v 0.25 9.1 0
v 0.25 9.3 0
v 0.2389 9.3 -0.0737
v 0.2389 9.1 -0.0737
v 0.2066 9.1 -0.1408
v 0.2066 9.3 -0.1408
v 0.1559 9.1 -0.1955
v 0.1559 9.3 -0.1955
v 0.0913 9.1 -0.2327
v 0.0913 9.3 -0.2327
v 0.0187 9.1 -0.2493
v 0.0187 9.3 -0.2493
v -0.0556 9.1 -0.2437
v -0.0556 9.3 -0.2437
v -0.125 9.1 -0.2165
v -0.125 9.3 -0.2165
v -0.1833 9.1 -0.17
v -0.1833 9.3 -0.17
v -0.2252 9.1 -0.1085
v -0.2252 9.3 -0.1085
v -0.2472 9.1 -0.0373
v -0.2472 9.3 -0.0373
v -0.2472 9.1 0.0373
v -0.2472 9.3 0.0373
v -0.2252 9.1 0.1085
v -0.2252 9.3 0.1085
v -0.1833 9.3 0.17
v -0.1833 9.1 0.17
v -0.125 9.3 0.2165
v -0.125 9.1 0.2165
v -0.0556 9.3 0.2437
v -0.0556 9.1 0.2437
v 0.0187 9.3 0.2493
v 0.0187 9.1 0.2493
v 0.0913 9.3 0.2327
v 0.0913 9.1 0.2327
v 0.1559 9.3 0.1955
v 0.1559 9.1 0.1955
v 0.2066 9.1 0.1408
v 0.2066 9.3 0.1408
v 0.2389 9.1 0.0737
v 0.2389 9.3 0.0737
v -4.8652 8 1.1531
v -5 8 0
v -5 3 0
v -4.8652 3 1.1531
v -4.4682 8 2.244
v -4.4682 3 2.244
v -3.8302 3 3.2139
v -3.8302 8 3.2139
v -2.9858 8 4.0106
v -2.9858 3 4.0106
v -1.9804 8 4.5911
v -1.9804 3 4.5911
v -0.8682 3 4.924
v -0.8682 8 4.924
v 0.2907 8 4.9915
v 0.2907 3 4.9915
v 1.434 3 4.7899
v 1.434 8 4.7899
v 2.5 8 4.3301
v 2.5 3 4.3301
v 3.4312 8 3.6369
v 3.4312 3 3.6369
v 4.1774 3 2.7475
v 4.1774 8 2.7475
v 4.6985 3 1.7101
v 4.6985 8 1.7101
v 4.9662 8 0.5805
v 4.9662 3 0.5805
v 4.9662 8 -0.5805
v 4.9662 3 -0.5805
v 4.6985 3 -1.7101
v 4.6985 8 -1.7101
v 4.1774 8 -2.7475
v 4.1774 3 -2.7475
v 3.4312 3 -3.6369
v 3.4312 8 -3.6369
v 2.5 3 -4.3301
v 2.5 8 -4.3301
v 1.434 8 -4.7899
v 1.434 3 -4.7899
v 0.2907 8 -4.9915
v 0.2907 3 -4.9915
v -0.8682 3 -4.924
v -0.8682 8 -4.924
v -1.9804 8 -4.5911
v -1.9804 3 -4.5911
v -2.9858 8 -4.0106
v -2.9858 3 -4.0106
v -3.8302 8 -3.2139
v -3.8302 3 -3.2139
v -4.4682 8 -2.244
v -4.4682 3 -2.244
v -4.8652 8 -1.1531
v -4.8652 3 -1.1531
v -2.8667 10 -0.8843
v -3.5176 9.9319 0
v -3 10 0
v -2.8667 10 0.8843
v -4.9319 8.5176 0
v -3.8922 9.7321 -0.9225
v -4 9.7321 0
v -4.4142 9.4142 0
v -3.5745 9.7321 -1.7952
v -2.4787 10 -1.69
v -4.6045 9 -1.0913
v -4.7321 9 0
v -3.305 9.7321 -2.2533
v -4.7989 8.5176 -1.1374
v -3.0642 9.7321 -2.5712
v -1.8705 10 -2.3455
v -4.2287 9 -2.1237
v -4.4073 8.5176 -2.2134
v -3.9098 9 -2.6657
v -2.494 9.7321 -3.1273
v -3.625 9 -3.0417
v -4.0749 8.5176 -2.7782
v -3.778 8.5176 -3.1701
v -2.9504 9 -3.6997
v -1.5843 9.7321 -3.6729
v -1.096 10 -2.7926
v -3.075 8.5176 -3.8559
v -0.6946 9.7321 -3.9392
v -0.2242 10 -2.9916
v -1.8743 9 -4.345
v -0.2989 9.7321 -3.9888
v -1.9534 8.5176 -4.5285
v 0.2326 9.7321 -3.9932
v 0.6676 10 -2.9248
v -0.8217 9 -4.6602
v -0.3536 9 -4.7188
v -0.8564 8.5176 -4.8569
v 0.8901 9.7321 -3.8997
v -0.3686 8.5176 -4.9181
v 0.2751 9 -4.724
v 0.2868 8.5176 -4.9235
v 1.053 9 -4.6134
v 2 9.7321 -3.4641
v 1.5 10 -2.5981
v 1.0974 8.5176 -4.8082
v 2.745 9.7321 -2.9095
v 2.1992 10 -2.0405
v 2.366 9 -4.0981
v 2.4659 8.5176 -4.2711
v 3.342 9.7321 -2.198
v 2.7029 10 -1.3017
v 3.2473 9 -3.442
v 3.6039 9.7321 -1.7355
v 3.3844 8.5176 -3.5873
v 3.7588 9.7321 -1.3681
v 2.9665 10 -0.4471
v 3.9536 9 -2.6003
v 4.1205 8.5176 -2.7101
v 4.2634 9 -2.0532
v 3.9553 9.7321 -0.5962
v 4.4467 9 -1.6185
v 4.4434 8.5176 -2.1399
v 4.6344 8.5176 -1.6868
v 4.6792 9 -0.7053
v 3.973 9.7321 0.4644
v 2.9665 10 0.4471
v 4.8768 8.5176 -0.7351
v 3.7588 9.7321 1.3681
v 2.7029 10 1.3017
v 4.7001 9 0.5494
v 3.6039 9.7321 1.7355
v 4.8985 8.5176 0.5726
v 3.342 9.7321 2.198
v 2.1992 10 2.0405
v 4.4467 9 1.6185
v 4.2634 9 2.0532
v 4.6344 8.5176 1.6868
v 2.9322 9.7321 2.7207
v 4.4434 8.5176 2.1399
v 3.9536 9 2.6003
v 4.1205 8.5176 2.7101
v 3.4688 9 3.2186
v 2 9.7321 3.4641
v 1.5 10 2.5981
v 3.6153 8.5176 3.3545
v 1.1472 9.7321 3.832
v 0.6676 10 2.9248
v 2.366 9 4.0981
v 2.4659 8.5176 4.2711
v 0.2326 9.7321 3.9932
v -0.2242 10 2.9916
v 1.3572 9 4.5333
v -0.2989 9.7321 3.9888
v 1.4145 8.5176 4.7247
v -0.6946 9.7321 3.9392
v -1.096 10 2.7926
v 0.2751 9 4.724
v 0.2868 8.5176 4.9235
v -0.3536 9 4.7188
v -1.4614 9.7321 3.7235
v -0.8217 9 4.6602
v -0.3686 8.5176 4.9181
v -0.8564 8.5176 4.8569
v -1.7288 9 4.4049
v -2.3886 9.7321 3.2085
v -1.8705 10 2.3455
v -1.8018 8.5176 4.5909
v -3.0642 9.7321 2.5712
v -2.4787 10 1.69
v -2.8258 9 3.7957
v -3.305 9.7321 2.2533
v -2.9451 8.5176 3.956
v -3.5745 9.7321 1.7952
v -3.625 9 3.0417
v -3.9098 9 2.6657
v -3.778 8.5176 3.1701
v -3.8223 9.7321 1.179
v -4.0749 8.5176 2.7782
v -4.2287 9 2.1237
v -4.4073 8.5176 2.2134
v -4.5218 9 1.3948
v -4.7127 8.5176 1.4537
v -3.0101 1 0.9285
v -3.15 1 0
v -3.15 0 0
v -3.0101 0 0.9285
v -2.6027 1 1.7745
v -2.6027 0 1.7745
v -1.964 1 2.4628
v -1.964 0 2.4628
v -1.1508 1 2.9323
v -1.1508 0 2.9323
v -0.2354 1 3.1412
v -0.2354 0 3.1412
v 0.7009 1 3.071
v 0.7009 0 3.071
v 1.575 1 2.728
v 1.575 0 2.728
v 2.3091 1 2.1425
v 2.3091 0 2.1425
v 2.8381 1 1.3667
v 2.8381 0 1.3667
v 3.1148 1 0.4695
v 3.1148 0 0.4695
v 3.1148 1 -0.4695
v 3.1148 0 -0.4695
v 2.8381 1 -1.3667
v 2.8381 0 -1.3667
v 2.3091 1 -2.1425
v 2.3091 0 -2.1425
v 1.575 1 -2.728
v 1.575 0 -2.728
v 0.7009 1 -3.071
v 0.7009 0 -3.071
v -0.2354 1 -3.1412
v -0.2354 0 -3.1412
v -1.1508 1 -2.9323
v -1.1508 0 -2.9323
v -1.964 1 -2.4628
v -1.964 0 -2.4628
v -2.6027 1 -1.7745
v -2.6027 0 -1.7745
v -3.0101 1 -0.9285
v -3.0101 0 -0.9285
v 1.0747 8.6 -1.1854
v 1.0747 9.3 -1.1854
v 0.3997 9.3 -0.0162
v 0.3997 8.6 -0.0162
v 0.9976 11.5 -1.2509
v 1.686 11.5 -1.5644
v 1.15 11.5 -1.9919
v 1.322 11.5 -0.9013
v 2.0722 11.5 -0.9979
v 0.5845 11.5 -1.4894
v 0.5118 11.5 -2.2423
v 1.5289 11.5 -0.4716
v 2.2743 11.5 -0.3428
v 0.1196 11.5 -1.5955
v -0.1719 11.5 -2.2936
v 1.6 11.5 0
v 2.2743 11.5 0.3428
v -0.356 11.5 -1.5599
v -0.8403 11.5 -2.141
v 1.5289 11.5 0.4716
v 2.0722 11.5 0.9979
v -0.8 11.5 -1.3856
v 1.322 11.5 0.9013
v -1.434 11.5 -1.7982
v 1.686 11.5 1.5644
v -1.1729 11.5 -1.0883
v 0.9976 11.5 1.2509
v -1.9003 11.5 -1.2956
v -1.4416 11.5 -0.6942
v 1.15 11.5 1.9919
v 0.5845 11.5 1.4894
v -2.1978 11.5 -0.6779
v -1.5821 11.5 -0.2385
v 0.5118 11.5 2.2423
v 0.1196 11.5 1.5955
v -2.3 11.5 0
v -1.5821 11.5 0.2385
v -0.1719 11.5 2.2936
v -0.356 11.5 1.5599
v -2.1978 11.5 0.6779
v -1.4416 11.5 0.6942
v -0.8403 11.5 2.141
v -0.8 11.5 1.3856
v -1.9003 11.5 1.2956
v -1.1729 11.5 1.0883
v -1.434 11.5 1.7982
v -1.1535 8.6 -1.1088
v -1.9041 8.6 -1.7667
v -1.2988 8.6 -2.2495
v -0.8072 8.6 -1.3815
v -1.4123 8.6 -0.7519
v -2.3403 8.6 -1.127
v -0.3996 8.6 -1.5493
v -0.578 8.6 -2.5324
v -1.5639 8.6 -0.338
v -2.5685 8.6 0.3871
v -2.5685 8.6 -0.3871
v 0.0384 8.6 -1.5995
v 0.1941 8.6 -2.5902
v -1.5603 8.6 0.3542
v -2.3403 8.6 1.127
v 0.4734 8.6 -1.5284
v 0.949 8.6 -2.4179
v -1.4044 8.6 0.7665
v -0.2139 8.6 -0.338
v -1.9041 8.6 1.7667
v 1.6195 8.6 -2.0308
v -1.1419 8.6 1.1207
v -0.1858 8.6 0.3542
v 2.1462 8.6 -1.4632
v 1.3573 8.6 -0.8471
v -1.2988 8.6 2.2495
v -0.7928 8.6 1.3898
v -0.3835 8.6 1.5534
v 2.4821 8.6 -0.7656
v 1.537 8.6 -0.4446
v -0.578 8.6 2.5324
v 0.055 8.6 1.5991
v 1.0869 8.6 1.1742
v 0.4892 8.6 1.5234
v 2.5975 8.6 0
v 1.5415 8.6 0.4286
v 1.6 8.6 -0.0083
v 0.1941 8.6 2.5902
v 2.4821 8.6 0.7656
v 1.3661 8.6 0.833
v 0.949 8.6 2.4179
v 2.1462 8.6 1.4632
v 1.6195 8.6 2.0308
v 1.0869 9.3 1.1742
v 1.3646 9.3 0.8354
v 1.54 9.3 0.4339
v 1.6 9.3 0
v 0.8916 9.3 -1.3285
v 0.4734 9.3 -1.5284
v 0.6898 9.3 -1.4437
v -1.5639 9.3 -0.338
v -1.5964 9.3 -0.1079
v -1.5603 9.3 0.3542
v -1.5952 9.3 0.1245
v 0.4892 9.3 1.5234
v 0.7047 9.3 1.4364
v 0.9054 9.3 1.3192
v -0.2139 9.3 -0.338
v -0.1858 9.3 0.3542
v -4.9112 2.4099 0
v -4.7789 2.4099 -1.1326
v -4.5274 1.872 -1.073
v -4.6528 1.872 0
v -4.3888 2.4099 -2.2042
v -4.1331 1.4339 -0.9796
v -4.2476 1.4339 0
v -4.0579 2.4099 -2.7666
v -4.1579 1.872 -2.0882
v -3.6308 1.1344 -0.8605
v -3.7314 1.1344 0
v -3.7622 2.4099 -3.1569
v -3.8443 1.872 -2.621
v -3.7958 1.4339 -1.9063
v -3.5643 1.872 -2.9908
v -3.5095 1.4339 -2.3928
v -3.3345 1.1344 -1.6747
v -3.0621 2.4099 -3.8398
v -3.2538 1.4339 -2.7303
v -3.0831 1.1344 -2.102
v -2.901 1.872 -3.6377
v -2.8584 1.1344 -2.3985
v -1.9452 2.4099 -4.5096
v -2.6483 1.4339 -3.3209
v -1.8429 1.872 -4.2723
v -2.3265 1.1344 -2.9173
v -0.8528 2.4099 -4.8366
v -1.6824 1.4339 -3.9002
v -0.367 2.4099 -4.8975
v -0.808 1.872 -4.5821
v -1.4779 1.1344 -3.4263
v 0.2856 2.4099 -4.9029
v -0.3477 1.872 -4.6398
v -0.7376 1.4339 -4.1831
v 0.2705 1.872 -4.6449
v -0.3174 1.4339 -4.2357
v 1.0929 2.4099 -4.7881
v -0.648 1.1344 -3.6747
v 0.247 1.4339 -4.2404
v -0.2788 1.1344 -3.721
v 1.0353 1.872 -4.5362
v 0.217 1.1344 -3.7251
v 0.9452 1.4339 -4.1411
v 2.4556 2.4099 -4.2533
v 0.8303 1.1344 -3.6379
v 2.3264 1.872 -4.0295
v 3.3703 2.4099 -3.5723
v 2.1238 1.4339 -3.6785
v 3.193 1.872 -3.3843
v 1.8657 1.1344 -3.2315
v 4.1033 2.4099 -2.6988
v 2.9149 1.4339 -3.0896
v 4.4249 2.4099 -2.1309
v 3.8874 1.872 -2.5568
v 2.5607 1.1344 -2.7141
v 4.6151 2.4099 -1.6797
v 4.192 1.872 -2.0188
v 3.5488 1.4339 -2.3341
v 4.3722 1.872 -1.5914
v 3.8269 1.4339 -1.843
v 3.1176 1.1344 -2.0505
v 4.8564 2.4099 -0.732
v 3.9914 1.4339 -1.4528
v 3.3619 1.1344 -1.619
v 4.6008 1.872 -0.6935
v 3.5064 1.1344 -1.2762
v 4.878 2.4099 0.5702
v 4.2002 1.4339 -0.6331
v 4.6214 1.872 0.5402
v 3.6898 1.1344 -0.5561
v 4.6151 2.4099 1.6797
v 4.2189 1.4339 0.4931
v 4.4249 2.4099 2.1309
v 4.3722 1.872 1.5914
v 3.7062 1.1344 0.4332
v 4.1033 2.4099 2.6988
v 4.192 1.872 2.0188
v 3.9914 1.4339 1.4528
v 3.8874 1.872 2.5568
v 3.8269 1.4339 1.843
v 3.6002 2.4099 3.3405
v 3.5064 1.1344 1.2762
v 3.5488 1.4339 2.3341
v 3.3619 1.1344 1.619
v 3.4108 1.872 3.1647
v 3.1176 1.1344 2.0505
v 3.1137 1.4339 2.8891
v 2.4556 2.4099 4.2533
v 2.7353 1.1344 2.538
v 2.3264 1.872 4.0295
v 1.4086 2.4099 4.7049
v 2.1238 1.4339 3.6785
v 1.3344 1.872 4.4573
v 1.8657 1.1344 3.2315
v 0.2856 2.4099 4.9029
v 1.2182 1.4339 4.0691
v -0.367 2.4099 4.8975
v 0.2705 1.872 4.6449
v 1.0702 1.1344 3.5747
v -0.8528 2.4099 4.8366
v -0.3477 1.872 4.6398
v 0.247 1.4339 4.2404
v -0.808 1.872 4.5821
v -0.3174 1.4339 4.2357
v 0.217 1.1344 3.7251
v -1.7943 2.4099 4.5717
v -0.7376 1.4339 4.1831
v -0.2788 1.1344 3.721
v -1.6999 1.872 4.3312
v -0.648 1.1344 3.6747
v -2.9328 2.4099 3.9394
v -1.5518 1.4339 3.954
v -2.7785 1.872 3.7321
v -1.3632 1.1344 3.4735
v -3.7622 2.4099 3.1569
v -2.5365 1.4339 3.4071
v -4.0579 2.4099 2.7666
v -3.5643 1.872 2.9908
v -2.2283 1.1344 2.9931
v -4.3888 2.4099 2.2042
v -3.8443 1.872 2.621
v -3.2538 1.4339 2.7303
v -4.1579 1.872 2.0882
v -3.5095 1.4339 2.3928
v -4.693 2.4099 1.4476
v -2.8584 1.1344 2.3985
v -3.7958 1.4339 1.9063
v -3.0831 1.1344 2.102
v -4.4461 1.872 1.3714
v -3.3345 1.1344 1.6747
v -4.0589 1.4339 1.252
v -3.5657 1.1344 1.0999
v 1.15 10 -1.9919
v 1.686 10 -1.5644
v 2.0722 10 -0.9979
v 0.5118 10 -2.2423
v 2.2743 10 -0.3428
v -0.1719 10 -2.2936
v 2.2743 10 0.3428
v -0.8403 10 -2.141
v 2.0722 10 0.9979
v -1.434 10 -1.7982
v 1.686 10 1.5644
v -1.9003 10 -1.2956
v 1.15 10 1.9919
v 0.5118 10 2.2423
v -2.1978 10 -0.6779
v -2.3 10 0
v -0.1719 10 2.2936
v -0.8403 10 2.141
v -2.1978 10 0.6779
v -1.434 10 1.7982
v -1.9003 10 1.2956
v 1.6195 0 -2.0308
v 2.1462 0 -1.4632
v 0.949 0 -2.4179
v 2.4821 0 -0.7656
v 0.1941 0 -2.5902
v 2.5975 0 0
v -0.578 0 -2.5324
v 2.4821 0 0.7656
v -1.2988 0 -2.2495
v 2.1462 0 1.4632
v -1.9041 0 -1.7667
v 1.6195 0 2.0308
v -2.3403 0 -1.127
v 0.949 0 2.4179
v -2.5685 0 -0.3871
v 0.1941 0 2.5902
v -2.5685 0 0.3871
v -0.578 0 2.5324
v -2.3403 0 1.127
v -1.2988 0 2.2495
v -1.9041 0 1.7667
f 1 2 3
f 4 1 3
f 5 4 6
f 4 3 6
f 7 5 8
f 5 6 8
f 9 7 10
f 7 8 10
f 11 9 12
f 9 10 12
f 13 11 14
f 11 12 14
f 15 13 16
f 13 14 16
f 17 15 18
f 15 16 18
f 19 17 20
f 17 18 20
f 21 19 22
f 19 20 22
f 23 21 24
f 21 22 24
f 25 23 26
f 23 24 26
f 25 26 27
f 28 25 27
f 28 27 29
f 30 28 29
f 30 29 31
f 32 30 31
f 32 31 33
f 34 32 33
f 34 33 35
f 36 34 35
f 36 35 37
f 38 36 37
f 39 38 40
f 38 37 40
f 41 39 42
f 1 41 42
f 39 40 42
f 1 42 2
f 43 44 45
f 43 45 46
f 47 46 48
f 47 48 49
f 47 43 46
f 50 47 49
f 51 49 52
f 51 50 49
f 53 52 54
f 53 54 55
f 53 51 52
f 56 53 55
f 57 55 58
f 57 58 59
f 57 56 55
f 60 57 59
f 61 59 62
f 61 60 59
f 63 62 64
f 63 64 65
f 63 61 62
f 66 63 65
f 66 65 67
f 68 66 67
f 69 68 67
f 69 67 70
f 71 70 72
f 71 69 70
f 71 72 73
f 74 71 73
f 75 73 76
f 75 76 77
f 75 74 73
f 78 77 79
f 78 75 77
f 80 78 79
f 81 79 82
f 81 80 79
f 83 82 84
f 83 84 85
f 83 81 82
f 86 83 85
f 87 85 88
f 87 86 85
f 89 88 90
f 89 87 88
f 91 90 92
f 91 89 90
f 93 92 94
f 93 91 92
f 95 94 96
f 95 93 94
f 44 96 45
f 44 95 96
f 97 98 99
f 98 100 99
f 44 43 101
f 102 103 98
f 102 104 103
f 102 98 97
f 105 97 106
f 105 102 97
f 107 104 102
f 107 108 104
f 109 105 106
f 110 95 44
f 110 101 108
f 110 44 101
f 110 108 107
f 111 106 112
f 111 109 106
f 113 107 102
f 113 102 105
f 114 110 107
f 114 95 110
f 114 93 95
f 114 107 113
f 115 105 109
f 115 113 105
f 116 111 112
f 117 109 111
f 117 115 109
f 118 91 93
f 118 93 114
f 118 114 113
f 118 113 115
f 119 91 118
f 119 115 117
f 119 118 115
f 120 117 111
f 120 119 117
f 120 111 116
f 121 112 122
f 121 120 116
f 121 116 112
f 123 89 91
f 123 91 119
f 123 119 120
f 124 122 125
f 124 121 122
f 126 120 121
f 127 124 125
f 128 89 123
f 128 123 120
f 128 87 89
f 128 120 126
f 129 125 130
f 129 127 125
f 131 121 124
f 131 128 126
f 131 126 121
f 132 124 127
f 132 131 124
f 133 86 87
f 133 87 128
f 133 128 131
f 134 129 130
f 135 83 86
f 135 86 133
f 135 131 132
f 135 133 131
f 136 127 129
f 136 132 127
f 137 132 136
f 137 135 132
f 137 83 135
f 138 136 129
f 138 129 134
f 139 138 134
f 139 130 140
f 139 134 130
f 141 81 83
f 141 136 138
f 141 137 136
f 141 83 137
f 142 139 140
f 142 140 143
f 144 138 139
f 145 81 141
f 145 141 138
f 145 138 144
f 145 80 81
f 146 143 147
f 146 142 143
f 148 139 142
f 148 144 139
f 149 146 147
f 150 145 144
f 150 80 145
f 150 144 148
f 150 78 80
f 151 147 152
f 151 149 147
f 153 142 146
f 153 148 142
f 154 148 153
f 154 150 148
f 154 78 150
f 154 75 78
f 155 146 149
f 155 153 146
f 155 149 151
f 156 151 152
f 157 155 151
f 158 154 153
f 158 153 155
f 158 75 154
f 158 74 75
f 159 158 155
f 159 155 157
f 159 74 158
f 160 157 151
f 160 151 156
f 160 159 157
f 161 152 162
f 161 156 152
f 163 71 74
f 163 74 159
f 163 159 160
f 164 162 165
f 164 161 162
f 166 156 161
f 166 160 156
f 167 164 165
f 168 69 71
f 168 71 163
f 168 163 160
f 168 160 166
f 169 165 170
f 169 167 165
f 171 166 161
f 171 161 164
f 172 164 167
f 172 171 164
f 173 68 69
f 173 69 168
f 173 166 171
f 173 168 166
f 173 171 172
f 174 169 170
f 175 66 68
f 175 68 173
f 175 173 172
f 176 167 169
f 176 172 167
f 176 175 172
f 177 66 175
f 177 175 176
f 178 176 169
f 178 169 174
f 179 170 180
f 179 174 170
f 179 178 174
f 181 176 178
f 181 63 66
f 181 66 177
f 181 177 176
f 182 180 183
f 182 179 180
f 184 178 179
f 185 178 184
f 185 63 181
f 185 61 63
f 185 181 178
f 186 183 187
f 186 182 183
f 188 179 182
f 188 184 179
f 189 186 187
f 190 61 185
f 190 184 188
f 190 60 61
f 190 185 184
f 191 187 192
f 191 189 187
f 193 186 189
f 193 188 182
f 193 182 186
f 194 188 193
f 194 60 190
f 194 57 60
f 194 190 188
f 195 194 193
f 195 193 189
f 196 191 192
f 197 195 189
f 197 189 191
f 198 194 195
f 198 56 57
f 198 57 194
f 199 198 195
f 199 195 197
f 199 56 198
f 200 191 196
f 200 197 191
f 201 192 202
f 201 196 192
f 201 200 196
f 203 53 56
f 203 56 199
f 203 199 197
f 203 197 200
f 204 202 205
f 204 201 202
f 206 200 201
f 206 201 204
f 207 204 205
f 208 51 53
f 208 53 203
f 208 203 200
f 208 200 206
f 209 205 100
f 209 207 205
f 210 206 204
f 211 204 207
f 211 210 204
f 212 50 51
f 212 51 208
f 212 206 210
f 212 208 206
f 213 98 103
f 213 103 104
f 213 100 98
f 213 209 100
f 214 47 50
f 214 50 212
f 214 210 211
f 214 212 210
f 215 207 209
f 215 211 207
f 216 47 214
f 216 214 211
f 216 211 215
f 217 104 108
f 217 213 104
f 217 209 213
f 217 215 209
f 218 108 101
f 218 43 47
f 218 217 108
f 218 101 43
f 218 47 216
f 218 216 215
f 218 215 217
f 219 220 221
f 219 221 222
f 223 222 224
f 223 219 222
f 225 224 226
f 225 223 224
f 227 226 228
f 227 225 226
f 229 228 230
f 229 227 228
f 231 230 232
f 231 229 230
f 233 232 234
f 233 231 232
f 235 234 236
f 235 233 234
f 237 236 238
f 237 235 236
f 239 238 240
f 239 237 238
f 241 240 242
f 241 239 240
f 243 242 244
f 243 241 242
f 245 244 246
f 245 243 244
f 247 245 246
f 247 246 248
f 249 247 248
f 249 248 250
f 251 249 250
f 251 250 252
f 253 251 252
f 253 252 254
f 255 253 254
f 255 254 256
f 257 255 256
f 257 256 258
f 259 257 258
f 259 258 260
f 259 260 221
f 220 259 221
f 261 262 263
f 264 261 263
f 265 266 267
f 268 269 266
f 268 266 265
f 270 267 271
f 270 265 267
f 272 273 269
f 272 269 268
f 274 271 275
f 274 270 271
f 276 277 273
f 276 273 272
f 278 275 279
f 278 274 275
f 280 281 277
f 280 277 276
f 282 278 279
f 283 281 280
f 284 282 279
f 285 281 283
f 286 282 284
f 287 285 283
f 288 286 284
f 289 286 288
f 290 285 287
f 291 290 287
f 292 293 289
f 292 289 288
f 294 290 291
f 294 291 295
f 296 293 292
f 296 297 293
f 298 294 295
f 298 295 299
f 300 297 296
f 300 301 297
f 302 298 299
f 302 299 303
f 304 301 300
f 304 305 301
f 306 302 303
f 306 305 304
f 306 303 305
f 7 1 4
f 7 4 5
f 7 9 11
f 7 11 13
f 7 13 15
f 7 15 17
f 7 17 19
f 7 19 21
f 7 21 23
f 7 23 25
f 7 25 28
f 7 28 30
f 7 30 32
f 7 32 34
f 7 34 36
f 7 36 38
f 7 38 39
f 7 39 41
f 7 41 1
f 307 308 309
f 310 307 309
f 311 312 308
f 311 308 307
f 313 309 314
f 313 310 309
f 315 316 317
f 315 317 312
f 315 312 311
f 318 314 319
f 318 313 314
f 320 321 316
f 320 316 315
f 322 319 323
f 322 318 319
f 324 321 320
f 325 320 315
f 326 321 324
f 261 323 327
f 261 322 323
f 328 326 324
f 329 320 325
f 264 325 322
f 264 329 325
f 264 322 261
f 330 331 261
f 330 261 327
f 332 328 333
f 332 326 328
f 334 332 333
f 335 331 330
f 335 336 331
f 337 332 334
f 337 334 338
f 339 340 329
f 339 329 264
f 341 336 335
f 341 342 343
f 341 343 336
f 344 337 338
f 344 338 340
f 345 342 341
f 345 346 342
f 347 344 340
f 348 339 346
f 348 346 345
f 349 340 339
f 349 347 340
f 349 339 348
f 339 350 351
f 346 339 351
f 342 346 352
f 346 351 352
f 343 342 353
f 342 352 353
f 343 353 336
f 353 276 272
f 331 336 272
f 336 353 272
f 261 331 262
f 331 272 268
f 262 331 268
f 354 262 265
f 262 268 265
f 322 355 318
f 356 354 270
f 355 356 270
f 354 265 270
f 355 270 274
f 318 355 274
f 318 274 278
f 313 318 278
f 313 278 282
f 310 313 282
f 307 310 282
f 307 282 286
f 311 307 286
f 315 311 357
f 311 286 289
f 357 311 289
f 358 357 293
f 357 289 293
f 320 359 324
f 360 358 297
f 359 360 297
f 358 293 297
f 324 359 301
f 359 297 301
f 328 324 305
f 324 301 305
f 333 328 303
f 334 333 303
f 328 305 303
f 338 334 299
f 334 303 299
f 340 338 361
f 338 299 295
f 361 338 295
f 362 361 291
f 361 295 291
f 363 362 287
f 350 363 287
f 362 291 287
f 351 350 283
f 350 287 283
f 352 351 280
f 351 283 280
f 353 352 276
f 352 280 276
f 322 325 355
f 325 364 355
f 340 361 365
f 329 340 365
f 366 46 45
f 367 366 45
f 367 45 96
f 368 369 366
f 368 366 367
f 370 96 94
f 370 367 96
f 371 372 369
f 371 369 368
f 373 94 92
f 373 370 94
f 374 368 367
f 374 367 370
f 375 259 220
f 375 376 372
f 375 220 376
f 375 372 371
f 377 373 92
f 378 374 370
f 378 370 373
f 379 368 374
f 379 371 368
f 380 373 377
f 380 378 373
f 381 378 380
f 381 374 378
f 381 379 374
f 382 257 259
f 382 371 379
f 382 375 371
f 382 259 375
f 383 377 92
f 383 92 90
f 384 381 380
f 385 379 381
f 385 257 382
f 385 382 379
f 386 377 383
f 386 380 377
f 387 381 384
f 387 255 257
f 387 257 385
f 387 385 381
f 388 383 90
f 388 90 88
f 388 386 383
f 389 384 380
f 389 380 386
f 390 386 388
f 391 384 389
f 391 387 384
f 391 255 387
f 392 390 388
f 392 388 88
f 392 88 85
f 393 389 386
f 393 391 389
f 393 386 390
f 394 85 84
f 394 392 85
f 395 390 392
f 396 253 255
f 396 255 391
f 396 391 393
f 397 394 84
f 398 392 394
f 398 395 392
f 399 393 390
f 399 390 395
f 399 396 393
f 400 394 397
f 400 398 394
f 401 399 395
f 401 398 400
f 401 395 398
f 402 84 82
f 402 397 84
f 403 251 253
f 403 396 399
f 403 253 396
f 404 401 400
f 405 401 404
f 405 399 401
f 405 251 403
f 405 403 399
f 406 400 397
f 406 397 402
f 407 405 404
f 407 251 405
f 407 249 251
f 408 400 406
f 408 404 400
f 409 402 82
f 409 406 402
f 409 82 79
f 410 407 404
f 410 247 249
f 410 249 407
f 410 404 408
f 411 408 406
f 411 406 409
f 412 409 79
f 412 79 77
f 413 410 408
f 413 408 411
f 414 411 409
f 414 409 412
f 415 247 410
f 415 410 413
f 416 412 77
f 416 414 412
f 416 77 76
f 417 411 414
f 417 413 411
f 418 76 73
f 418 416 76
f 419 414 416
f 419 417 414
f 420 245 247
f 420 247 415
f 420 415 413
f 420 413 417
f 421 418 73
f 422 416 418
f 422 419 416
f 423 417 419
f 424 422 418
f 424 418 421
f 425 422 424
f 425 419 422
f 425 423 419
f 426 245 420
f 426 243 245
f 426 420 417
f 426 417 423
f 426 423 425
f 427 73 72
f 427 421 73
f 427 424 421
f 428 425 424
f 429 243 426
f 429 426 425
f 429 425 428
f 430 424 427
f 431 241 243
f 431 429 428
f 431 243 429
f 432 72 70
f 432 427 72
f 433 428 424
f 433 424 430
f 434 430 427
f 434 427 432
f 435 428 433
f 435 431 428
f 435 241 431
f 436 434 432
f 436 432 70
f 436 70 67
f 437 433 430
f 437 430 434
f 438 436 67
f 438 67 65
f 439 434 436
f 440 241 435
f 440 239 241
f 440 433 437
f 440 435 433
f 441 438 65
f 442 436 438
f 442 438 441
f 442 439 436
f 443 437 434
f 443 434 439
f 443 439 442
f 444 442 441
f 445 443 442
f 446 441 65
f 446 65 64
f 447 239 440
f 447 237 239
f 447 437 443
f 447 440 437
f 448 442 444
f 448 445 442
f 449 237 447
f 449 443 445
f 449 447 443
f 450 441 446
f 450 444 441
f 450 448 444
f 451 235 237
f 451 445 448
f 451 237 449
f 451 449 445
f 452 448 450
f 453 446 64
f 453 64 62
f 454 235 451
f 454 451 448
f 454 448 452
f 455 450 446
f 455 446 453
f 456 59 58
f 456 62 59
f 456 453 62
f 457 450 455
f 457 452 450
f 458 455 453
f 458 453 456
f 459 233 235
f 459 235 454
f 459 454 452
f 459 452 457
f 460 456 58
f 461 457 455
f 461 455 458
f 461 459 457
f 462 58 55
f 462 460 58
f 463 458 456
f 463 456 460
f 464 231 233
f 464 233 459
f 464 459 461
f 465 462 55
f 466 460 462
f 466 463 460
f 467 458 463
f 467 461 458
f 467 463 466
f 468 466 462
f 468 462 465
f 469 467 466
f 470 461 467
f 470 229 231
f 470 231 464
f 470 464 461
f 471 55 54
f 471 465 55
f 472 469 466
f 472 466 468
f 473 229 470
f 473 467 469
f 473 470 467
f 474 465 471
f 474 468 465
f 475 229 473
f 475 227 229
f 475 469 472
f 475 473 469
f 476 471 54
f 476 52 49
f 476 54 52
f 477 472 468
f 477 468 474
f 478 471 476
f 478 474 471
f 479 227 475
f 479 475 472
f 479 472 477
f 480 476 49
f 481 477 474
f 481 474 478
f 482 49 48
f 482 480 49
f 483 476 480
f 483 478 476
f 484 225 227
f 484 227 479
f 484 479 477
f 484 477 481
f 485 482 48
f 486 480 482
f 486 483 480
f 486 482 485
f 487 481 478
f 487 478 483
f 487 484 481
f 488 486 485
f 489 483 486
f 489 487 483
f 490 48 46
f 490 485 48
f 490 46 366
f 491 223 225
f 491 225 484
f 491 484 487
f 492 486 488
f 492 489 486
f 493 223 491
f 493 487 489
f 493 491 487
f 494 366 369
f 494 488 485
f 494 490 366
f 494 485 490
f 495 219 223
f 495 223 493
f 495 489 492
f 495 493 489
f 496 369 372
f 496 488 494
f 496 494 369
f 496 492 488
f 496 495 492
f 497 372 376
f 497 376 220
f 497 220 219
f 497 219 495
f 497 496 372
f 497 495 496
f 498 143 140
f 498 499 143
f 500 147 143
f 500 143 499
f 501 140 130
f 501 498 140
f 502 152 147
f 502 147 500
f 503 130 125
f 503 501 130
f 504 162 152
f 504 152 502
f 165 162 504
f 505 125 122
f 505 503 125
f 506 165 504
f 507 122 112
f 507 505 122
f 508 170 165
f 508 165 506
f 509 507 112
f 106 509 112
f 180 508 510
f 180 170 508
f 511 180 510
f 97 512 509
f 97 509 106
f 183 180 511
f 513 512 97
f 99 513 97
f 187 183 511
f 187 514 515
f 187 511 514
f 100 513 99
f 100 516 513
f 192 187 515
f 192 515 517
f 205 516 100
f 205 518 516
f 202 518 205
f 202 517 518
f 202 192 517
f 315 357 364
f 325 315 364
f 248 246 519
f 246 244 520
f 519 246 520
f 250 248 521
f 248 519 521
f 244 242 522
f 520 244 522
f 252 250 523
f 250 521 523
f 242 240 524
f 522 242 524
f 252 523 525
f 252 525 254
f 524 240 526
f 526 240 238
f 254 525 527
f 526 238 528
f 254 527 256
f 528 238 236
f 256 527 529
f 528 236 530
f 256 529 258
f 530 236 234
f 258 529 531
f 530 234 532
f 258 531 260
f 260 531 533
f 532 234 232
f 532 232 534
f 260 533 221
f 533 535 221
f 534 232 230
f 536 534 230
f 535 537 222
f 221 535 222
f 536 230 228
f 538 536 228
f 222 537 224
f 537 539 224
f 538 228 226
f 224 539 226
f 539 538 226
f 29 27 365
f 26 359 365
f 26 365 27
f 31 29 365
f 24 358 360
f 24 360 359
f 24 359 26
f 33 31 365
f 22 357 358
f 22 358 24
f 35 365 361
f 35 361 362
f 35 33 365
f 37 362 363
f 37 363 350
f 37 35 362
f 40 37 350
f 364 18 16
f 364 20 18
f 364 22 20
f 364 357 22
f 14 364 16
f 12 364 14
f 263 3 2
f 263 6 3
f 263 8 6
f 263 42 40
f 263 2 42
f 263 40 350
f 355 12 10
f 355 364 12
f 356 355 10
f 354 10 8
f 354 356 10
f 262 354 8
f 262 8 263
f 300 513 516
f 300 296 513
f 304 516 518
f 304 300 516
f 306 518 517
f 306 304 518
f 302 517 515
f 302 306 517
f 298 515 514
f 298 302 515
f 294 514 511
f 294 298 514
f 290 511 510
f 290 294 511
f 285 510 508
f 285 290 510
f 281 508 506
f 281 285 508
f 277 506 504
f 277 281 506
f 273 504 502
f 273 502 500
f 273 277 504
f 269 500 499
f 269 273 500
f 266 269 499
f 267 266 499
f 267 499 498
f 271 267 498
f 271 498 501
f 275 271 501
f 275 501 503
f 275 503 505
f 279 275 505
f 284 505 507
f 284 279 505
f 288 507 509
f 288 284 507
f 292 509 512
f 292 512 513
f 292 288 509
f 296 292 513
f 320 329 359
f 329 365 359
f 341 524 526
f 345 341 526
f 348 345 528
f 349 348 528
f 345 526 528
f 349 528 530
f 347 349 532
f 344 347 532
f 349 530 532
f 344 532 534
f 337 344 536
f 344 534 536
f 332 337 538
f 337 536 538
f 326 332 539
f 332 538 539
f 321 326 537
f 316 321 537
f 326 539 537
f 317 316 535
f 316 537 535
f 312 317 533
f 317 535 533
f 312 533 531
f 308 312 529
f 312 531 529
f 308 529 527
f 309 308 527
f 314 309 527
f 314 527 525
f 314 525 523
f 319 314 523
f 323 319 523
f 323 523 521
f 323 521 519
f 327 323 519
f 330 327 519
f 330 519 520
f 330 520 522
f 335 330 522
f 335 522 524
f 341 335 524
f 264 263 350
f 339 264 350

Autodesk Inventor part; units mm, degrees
ref_plane "YZ Plane" through (0, 0, 0) normal (1, 0, 0) x (0, 1, 0)
ref_plane "XZ Plane" through (0, 0, 0) normal (0, 1, 0) x (-1, 0, 0)
ref_plane "XY Plane" through (0, 0, 0) normal (0, 0, 1) x (1, 0, 0)
sketch "Sketch1" plane through (0, 0, 0) normal (0, 0, 1) x (1, 0, 0)
  line L0 (0, 0) -> (0, 11.5)
  line L1 (0, 0) -> (-3.15, 0)
  line L2 (-3.15, 0) -> (-3.15, 1)
  arc A0 (-5, 3) -> (-3.15, 1) centre (-2.9939, 3) ccw
  line L3 (-5, 3) -> (-5, 8)
  arc A1 (-3, 10) -> (-5, 8) centre (-3, 8) ccw
  line L4 (-3, 10) -> (-2.3, 10)
  line L5 (-2.3, 10) -> (-2.3, 11.5)
  line L6 (-2.3, 11.5) -> (0, 11.5)
  dimension "d0" = 11.5
  dimension "d1" = 3.15
  dimension "d2" = 1
  dimension "d3" = 5
  dimension "d4" = 5
  dimension "d5" = 2.3
  dimension "d7" = 2
  dimension "d8" = 2
  dimension "d9" = 2
revolve "Revolution1" add sketch "Sketch1" angle 360 about axis through (0, 0, 0) along (0, 1, 0)
sketch "Sketch2" plane through (0, 0, 0) normal (0, -1, 0) x (1, 0, 0)
  circle A0 centre (0, 0) radius 2.5975
  dimension "d11" = 5.195
extrude "Extrusion1" cut sketch "Sketch2" against normal blind 8.6
sketch "Sketch3" plane through (0, 11.5, 0) normal (0, 1, 0) x (1, 0, 0)
  circle A0 centre (0, 0) radius 2.3 projected
  circle A1 centre (0, 0) radius 1.6
  dimension "d14" = 0.7
extrude "Extrusion2" cut sketch "Sketch3" against normal blind 2.2 contours A1
sketch "Sketch4" plane through (0, 9.3, 0) normal (0, 1, 0) x (1, 0, 0)
  circle A0 centre (0, 0) radius 0.4 construction
  circle A1 centre (0, 0) radius 1.6 projected
  line L0 (-1.5639, 0.338) -> (-0.2139, 0.338)
  line L1 (-0.2139, 0.338) -> (0.4734, 1.5284)
  arc A2 (0.4734, 1.5284) -> (-1.5639, 0.338) centre (0, 0) ccw
  dimension "d17" = 0.8
  dimension "d18" = 1.35
  dimension "d19" = 120
extrude "Extrusion3" cut sketch "Sketch4" against normal blind 4 contours L1 L0 A1 picked at (0.1203, 1.1544)
pattern_circular "Circular Pattern1" count 3 over 360 about axis through (0, 11.5, 0) along (0, -1, 0) of "Extrusion3"
sketch "Sketch5" plane through (0, 9.3, 0) normal (0, 1, 0) x (1, 0, 0)
  circle A0 centre (0, 0) radius 0.25
  dimension "d25" = 0.5
extrude "Extrusion4" cut sketch "Sketch5" against normal blind 0.2
properties part number "Lego head"
